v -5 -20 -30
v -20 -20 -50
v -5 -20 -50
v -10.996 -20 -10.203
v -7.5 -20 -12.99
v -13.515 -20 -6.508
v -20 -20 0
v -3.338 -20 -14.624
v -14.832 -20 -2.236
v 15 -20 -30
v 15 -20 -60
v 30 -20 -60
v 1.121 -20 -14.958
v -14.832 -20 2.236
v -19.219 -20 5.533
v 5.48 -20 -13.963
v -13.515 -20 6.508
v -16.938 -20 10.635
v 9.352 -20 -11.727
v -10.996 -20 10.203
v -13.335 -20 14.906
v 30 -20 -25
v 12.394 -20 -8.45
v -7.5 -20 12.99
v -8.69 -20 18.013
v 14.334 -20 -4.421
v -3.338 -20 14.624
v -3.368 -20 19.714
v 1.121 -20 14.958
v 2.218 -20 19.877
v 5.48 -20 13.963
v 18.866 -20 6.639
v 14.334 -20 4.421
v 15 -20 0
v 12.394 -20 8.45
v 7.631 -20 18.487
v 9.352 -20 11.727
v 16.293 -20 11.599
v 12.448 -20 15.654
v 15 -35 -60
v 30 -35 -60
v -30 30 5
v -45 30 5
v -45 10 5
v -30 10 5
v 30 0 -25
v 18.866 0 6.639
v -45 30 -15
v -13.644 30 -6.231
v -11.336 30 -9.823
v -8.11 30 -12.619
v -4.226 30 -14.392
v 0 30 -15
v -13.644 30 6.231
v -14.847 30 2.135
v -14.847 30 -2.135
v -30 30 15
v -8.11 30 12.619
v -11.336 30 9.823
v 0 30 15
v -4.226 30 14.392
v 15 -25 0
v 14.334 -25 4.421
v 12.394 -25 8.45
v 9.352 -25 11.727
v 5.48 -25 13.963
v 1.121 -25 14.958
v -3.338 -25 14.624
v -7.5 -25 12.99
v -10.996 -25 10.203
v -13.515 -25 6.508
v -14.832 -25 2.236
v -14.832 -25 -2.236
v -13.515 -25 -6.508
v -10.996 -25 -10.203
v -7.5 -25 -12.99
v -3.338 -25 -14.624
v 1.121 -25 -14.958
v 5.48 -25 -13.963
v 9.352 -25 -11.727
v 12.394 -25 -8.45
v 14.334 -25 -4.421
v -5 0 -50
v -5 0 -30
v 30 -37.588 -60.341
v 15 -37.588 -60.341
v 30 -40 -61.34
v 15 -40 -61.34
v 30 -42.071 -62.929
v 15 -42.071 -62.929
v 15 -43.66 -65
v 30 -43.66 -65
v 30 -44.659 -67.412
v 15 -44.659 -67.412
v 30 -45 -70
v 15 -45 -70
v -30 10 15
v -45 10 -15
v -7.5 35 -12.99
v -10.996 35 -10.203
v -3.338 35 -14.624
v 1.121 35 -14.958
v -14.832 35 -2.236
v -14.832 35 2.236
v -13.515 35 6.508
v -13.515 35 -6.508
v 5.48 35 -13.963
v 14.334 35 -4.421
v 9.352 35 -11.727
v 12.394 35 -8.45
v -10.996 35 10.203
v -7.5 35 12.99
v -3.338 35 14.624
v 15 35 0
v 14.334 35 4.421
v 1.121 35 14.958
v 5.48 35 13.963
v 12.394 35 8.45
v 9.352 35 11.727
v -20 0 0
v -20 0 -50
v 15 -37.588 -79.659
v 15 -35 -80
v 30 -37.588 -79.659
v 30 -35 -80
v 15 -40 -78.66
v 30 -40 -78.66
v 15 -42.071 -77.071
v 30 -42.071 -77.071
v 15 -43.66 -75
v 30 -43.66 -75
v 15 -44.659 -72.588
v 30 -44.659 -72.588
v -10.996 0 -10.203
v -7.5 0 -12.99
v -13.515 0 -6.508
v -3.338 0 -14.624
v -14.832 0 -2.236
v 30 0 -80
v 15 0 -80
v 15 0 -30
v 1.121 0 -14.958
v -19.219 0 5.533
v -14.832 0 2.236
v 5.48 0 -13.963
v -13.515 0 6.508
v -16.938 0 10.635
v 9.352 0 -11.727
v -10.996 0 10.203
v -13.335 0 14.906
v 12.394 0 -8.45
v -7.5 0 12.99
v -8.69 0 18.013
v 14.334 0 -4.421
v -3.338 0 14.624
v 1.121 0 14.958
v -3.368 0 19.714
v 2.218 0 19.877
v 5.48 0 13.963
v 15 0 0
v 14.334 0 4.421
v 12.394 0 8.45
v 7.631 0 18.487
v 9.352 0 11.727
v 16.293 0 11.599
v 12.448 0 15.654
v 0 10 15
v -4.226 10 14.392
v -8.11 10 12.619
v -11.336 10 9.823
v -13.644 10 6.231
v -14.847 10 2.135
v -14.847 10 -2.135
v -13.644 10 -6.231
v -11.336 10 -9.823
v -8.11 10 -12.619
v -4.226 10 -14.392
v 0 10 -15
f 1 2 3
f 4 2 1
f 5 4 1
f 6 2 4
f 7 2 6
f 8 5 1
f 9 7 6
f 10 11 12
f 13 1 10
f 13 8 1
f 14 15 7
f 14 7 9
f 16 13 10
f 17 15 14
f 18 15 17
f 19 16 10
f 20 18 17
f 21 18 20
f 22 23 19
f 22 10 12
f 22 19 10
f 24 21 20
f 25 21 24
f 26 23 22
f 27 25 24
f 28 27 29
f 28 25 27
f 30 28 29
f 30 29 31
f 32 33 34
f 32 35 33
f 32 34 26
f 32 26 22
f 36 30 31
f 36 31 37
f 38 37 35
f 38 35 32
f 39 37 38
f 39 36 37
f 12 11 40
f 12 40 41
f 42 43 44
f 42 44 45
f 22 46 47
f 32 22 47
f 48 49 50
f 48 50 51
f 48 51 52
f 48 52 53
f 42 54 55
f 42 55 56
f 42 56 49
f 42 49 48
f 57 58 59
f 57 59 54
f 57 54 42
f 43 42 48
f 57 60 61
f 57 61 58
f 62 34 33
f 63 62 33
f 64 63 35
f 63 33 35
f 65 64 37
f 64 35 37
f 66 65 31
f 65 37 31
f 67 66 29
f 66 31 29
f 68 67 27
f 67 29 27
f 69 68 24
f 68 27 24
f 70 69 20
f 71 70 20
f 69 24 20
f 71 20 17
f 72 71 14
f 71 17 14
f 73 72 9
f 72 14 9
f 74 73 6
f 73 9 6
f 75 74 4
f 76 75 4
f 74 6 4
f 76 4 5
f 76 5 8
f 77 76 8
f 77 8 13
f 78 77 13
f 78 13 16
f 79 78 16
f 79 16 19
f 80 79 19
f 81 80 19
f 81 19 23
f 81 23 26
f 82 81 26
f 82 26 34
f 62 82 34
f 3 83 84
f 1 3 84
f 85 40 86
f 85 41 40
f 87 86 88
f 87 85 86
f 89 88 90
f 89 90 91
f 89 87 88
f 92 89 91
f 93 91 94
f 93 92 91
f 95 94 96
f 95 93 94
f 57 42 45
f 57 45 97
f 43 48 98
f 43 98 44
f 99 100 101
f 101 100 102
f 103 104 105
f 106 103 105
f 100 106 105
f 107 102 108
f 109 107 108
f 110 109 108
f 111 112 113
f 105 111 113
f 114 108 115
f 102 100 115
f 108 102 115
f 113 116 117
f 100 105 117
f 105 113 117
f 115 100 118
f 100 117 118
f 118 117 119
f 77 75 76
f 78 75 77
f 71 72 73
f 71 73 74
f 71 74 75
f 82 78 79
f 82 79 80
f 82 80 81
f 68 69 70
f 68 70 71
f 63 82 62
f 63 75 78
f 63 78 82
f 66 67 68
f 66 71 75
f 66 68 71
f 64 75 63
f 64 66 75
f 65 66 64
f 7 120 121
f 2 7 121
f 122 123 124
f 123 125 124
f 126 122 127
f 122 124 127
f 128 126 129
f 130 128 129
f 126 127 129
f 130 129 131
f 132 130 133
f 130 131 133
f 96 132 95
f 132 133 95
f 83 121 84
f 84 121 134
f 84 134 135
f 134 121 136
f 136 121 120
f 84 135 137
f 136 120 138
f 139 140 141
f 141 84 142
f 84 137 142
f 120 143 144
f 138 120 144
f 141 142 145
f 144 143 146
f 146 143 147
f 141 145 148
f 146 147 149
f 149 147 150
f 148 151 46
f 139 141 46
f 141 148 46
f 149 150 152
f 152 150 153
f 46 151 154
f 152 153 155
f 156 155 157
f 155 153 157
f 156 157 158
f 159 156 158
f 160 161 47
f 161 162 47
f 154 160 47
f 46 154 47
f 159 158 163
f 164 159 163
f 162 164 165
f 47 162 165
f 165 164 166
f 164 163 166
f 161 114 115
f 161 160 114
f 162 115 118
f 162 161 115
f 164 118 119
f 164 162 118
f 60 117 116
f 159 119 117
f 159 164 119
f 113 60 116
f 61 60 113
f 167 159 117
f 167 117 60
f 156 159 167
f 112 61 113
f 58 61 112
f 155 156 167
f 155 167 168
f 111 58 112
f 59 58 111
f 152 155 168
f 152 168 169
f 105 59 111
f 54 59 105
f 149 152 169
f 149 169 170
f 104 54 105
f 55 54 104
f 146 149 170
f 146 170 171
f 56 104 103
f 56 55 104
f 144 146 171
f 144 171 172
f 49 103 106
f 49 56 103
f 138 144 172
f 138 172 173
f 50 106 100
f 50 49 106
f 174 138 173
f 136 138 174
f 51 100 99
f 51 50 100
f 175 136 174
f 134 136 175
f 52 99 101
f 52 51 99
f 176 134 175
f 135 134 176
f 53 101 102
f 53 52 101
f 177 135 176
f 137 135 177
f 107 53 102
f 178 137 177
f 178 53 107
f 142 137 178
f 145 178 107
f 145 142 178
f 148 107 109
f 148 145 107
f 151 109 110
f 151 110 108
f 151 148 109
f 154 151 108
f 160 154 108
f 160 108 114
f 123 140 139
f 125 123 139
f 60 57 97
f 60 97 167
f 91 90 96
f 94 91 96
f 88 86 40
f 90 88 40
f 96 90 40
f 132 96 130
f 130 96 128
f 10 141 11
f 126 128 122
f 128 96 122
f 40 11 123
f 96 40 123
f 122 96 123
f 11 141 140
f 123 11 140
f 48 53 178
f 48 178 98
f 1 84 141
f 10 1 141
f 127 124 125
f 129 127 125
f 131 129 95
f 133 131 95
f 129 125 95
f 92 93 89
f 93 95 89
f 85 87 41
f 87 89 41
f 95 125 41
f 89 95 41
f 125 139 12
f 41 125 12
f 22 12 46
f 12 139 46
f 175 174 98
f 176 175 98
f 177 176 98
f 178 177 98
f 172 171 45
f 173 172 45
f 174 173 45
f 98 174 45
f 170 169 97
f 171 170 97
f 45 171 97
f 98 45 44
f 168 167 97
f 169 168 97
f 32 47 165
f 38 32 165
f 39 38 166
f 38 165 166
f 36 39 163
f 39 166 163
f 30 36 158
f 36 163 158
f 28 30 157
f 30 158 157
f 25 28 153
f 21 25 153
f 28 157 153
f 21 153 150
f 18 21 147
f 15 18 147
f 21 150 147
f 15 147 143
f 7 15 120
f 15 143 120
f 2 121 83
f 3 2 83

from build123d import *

# Parameters (mm, degrees)
F0_R          = 15
F0_W          = 15
F0_H          = 20
F1_DEPTH      = 20
F2_DEPTH      = 45
F3_DEPTH      = 25
F3_DEPTH_BACK = 35
F4_R          = 9.99999
F6_DEPTH      = 25
F7_DEPTH      = 5


# Not quite as in the source:
# - a fillet or chamfer is up to 0.001 mm smaller than in the source, because OpenCascade refuses the exact size


with BuildPart() as f1:
    # F0 (on Front) → F1 (new body)
    with BuildSketch(Plane.XZ):
        with BuildLine():
            ThreePointArc((-20, 0), (0, -20), (20, 0))
            ThreePointArc((20, 0), (19.7144383856, 3.3676281177), (18.8659080861, 6.6390897033))
            ThreePointArc((18.8659080861, 6.6390897033), (-3.3676281177, 19.7144383856), (-20, 0))
        make_face()
        Circle(F0_R, mode=Mode.SUBTRACT)
        with BuildLine():
            ThreePointArc((18.8659080861, 6.6390897033), (19.7144383856, 3.3676281177), (20, 0))
            ThreePointArc((20, 0), (0, -20), (-20, 0))
            Line((-20, 0), (-20, -50))
            Line((-20, -50), (-5, -50))
            Line((-5, -50), (-5, -30))
            Line((-5, -30), (15, -30))
            Line((15, -30), (15, -60))
            Line((15, -60), (30, -60))
            Line((30, -60), (30, -25))
            Line((30, -25), (18.8659080861, 6.6390897033))
        make_face()
        with Locations((22.5, -70)):
            Rectangle(F0_W, F0_H)
    extrude(amount=F1_DEPTH)

    # F0 (on Front) → F2 (join)
    with BuildSketch(Plane.XZ):
        with Locations((22.5, -70)):
            Rectangle(F0_W, F0_H)
    extrude(amount=F2_DEPTH)

    # F0 (on Front) → F3 (join, two sides)
    with BuildSketch(Plane.XZ) as f3_sk:
        Circle(F0_R)
    extrude(amount=F3_DEPTH)
    extrude(f3_sk.sketch, amount=-F3_DEPTH_BACK)

    # F4 (radius 10 in the source; OpenCascade refuses exactly that, so slightly less here)
    f4_edges = [f1.edges().sort_by_distance(p)[0] for p in [
        (22.5, -45, -60),
        (22.5, -45, -80),
    ]]
    fillet(f4_edges, radius=F4_R)

    # F5 (on face) → F6 (join)
    with BuildSketch(Plane(origin=(0, 35, 0), x_dir=(-1, 0, 0), z_dir=(0, 1, 0))):
        with BuildLine():
            Line((30, 15), (0, 15))
            ThreePointArc((0, 15), (10.6066017178, 10.6066017178), (15, 0))
            ThreePointArc((15, 0), (10.6066017178, -10.6066017178), (0, -15))
            Line((0, -15), (45, -15))
            Line((45, -15), (45, 5))
            Line((45, 5), (30, 5))
            Line((30, 5), (30, 15))
        make_face()
    extrude(amount=-F6_DEPTH)

    # F5 (on face) → F7 (cut)
    with BuildSketch(Plane(origin=(0, 35, 0), x_dir=(-1, 0, 0), z_dir=(0, 1, 0))):
        with BuildLine():
            Line((30, 15), (0, 15))
            ThreePointArc((0, 15), (10.6066017178, 10.6066017178), (15, 0))
            ThreePointArc((15, 0), (10.6066017178, -10.6066017178), (0, -15))
            Line((0, -15), (45, -15))
            Line((45, -15), (45, 5))
            Line((45, 5), (30, 5))
            Line((30, 5), (30, 15))
        make_face()
    extrude(amount=-F7_DEPTH, mode=Mode.SUBTRACT)


solid = f1.part
